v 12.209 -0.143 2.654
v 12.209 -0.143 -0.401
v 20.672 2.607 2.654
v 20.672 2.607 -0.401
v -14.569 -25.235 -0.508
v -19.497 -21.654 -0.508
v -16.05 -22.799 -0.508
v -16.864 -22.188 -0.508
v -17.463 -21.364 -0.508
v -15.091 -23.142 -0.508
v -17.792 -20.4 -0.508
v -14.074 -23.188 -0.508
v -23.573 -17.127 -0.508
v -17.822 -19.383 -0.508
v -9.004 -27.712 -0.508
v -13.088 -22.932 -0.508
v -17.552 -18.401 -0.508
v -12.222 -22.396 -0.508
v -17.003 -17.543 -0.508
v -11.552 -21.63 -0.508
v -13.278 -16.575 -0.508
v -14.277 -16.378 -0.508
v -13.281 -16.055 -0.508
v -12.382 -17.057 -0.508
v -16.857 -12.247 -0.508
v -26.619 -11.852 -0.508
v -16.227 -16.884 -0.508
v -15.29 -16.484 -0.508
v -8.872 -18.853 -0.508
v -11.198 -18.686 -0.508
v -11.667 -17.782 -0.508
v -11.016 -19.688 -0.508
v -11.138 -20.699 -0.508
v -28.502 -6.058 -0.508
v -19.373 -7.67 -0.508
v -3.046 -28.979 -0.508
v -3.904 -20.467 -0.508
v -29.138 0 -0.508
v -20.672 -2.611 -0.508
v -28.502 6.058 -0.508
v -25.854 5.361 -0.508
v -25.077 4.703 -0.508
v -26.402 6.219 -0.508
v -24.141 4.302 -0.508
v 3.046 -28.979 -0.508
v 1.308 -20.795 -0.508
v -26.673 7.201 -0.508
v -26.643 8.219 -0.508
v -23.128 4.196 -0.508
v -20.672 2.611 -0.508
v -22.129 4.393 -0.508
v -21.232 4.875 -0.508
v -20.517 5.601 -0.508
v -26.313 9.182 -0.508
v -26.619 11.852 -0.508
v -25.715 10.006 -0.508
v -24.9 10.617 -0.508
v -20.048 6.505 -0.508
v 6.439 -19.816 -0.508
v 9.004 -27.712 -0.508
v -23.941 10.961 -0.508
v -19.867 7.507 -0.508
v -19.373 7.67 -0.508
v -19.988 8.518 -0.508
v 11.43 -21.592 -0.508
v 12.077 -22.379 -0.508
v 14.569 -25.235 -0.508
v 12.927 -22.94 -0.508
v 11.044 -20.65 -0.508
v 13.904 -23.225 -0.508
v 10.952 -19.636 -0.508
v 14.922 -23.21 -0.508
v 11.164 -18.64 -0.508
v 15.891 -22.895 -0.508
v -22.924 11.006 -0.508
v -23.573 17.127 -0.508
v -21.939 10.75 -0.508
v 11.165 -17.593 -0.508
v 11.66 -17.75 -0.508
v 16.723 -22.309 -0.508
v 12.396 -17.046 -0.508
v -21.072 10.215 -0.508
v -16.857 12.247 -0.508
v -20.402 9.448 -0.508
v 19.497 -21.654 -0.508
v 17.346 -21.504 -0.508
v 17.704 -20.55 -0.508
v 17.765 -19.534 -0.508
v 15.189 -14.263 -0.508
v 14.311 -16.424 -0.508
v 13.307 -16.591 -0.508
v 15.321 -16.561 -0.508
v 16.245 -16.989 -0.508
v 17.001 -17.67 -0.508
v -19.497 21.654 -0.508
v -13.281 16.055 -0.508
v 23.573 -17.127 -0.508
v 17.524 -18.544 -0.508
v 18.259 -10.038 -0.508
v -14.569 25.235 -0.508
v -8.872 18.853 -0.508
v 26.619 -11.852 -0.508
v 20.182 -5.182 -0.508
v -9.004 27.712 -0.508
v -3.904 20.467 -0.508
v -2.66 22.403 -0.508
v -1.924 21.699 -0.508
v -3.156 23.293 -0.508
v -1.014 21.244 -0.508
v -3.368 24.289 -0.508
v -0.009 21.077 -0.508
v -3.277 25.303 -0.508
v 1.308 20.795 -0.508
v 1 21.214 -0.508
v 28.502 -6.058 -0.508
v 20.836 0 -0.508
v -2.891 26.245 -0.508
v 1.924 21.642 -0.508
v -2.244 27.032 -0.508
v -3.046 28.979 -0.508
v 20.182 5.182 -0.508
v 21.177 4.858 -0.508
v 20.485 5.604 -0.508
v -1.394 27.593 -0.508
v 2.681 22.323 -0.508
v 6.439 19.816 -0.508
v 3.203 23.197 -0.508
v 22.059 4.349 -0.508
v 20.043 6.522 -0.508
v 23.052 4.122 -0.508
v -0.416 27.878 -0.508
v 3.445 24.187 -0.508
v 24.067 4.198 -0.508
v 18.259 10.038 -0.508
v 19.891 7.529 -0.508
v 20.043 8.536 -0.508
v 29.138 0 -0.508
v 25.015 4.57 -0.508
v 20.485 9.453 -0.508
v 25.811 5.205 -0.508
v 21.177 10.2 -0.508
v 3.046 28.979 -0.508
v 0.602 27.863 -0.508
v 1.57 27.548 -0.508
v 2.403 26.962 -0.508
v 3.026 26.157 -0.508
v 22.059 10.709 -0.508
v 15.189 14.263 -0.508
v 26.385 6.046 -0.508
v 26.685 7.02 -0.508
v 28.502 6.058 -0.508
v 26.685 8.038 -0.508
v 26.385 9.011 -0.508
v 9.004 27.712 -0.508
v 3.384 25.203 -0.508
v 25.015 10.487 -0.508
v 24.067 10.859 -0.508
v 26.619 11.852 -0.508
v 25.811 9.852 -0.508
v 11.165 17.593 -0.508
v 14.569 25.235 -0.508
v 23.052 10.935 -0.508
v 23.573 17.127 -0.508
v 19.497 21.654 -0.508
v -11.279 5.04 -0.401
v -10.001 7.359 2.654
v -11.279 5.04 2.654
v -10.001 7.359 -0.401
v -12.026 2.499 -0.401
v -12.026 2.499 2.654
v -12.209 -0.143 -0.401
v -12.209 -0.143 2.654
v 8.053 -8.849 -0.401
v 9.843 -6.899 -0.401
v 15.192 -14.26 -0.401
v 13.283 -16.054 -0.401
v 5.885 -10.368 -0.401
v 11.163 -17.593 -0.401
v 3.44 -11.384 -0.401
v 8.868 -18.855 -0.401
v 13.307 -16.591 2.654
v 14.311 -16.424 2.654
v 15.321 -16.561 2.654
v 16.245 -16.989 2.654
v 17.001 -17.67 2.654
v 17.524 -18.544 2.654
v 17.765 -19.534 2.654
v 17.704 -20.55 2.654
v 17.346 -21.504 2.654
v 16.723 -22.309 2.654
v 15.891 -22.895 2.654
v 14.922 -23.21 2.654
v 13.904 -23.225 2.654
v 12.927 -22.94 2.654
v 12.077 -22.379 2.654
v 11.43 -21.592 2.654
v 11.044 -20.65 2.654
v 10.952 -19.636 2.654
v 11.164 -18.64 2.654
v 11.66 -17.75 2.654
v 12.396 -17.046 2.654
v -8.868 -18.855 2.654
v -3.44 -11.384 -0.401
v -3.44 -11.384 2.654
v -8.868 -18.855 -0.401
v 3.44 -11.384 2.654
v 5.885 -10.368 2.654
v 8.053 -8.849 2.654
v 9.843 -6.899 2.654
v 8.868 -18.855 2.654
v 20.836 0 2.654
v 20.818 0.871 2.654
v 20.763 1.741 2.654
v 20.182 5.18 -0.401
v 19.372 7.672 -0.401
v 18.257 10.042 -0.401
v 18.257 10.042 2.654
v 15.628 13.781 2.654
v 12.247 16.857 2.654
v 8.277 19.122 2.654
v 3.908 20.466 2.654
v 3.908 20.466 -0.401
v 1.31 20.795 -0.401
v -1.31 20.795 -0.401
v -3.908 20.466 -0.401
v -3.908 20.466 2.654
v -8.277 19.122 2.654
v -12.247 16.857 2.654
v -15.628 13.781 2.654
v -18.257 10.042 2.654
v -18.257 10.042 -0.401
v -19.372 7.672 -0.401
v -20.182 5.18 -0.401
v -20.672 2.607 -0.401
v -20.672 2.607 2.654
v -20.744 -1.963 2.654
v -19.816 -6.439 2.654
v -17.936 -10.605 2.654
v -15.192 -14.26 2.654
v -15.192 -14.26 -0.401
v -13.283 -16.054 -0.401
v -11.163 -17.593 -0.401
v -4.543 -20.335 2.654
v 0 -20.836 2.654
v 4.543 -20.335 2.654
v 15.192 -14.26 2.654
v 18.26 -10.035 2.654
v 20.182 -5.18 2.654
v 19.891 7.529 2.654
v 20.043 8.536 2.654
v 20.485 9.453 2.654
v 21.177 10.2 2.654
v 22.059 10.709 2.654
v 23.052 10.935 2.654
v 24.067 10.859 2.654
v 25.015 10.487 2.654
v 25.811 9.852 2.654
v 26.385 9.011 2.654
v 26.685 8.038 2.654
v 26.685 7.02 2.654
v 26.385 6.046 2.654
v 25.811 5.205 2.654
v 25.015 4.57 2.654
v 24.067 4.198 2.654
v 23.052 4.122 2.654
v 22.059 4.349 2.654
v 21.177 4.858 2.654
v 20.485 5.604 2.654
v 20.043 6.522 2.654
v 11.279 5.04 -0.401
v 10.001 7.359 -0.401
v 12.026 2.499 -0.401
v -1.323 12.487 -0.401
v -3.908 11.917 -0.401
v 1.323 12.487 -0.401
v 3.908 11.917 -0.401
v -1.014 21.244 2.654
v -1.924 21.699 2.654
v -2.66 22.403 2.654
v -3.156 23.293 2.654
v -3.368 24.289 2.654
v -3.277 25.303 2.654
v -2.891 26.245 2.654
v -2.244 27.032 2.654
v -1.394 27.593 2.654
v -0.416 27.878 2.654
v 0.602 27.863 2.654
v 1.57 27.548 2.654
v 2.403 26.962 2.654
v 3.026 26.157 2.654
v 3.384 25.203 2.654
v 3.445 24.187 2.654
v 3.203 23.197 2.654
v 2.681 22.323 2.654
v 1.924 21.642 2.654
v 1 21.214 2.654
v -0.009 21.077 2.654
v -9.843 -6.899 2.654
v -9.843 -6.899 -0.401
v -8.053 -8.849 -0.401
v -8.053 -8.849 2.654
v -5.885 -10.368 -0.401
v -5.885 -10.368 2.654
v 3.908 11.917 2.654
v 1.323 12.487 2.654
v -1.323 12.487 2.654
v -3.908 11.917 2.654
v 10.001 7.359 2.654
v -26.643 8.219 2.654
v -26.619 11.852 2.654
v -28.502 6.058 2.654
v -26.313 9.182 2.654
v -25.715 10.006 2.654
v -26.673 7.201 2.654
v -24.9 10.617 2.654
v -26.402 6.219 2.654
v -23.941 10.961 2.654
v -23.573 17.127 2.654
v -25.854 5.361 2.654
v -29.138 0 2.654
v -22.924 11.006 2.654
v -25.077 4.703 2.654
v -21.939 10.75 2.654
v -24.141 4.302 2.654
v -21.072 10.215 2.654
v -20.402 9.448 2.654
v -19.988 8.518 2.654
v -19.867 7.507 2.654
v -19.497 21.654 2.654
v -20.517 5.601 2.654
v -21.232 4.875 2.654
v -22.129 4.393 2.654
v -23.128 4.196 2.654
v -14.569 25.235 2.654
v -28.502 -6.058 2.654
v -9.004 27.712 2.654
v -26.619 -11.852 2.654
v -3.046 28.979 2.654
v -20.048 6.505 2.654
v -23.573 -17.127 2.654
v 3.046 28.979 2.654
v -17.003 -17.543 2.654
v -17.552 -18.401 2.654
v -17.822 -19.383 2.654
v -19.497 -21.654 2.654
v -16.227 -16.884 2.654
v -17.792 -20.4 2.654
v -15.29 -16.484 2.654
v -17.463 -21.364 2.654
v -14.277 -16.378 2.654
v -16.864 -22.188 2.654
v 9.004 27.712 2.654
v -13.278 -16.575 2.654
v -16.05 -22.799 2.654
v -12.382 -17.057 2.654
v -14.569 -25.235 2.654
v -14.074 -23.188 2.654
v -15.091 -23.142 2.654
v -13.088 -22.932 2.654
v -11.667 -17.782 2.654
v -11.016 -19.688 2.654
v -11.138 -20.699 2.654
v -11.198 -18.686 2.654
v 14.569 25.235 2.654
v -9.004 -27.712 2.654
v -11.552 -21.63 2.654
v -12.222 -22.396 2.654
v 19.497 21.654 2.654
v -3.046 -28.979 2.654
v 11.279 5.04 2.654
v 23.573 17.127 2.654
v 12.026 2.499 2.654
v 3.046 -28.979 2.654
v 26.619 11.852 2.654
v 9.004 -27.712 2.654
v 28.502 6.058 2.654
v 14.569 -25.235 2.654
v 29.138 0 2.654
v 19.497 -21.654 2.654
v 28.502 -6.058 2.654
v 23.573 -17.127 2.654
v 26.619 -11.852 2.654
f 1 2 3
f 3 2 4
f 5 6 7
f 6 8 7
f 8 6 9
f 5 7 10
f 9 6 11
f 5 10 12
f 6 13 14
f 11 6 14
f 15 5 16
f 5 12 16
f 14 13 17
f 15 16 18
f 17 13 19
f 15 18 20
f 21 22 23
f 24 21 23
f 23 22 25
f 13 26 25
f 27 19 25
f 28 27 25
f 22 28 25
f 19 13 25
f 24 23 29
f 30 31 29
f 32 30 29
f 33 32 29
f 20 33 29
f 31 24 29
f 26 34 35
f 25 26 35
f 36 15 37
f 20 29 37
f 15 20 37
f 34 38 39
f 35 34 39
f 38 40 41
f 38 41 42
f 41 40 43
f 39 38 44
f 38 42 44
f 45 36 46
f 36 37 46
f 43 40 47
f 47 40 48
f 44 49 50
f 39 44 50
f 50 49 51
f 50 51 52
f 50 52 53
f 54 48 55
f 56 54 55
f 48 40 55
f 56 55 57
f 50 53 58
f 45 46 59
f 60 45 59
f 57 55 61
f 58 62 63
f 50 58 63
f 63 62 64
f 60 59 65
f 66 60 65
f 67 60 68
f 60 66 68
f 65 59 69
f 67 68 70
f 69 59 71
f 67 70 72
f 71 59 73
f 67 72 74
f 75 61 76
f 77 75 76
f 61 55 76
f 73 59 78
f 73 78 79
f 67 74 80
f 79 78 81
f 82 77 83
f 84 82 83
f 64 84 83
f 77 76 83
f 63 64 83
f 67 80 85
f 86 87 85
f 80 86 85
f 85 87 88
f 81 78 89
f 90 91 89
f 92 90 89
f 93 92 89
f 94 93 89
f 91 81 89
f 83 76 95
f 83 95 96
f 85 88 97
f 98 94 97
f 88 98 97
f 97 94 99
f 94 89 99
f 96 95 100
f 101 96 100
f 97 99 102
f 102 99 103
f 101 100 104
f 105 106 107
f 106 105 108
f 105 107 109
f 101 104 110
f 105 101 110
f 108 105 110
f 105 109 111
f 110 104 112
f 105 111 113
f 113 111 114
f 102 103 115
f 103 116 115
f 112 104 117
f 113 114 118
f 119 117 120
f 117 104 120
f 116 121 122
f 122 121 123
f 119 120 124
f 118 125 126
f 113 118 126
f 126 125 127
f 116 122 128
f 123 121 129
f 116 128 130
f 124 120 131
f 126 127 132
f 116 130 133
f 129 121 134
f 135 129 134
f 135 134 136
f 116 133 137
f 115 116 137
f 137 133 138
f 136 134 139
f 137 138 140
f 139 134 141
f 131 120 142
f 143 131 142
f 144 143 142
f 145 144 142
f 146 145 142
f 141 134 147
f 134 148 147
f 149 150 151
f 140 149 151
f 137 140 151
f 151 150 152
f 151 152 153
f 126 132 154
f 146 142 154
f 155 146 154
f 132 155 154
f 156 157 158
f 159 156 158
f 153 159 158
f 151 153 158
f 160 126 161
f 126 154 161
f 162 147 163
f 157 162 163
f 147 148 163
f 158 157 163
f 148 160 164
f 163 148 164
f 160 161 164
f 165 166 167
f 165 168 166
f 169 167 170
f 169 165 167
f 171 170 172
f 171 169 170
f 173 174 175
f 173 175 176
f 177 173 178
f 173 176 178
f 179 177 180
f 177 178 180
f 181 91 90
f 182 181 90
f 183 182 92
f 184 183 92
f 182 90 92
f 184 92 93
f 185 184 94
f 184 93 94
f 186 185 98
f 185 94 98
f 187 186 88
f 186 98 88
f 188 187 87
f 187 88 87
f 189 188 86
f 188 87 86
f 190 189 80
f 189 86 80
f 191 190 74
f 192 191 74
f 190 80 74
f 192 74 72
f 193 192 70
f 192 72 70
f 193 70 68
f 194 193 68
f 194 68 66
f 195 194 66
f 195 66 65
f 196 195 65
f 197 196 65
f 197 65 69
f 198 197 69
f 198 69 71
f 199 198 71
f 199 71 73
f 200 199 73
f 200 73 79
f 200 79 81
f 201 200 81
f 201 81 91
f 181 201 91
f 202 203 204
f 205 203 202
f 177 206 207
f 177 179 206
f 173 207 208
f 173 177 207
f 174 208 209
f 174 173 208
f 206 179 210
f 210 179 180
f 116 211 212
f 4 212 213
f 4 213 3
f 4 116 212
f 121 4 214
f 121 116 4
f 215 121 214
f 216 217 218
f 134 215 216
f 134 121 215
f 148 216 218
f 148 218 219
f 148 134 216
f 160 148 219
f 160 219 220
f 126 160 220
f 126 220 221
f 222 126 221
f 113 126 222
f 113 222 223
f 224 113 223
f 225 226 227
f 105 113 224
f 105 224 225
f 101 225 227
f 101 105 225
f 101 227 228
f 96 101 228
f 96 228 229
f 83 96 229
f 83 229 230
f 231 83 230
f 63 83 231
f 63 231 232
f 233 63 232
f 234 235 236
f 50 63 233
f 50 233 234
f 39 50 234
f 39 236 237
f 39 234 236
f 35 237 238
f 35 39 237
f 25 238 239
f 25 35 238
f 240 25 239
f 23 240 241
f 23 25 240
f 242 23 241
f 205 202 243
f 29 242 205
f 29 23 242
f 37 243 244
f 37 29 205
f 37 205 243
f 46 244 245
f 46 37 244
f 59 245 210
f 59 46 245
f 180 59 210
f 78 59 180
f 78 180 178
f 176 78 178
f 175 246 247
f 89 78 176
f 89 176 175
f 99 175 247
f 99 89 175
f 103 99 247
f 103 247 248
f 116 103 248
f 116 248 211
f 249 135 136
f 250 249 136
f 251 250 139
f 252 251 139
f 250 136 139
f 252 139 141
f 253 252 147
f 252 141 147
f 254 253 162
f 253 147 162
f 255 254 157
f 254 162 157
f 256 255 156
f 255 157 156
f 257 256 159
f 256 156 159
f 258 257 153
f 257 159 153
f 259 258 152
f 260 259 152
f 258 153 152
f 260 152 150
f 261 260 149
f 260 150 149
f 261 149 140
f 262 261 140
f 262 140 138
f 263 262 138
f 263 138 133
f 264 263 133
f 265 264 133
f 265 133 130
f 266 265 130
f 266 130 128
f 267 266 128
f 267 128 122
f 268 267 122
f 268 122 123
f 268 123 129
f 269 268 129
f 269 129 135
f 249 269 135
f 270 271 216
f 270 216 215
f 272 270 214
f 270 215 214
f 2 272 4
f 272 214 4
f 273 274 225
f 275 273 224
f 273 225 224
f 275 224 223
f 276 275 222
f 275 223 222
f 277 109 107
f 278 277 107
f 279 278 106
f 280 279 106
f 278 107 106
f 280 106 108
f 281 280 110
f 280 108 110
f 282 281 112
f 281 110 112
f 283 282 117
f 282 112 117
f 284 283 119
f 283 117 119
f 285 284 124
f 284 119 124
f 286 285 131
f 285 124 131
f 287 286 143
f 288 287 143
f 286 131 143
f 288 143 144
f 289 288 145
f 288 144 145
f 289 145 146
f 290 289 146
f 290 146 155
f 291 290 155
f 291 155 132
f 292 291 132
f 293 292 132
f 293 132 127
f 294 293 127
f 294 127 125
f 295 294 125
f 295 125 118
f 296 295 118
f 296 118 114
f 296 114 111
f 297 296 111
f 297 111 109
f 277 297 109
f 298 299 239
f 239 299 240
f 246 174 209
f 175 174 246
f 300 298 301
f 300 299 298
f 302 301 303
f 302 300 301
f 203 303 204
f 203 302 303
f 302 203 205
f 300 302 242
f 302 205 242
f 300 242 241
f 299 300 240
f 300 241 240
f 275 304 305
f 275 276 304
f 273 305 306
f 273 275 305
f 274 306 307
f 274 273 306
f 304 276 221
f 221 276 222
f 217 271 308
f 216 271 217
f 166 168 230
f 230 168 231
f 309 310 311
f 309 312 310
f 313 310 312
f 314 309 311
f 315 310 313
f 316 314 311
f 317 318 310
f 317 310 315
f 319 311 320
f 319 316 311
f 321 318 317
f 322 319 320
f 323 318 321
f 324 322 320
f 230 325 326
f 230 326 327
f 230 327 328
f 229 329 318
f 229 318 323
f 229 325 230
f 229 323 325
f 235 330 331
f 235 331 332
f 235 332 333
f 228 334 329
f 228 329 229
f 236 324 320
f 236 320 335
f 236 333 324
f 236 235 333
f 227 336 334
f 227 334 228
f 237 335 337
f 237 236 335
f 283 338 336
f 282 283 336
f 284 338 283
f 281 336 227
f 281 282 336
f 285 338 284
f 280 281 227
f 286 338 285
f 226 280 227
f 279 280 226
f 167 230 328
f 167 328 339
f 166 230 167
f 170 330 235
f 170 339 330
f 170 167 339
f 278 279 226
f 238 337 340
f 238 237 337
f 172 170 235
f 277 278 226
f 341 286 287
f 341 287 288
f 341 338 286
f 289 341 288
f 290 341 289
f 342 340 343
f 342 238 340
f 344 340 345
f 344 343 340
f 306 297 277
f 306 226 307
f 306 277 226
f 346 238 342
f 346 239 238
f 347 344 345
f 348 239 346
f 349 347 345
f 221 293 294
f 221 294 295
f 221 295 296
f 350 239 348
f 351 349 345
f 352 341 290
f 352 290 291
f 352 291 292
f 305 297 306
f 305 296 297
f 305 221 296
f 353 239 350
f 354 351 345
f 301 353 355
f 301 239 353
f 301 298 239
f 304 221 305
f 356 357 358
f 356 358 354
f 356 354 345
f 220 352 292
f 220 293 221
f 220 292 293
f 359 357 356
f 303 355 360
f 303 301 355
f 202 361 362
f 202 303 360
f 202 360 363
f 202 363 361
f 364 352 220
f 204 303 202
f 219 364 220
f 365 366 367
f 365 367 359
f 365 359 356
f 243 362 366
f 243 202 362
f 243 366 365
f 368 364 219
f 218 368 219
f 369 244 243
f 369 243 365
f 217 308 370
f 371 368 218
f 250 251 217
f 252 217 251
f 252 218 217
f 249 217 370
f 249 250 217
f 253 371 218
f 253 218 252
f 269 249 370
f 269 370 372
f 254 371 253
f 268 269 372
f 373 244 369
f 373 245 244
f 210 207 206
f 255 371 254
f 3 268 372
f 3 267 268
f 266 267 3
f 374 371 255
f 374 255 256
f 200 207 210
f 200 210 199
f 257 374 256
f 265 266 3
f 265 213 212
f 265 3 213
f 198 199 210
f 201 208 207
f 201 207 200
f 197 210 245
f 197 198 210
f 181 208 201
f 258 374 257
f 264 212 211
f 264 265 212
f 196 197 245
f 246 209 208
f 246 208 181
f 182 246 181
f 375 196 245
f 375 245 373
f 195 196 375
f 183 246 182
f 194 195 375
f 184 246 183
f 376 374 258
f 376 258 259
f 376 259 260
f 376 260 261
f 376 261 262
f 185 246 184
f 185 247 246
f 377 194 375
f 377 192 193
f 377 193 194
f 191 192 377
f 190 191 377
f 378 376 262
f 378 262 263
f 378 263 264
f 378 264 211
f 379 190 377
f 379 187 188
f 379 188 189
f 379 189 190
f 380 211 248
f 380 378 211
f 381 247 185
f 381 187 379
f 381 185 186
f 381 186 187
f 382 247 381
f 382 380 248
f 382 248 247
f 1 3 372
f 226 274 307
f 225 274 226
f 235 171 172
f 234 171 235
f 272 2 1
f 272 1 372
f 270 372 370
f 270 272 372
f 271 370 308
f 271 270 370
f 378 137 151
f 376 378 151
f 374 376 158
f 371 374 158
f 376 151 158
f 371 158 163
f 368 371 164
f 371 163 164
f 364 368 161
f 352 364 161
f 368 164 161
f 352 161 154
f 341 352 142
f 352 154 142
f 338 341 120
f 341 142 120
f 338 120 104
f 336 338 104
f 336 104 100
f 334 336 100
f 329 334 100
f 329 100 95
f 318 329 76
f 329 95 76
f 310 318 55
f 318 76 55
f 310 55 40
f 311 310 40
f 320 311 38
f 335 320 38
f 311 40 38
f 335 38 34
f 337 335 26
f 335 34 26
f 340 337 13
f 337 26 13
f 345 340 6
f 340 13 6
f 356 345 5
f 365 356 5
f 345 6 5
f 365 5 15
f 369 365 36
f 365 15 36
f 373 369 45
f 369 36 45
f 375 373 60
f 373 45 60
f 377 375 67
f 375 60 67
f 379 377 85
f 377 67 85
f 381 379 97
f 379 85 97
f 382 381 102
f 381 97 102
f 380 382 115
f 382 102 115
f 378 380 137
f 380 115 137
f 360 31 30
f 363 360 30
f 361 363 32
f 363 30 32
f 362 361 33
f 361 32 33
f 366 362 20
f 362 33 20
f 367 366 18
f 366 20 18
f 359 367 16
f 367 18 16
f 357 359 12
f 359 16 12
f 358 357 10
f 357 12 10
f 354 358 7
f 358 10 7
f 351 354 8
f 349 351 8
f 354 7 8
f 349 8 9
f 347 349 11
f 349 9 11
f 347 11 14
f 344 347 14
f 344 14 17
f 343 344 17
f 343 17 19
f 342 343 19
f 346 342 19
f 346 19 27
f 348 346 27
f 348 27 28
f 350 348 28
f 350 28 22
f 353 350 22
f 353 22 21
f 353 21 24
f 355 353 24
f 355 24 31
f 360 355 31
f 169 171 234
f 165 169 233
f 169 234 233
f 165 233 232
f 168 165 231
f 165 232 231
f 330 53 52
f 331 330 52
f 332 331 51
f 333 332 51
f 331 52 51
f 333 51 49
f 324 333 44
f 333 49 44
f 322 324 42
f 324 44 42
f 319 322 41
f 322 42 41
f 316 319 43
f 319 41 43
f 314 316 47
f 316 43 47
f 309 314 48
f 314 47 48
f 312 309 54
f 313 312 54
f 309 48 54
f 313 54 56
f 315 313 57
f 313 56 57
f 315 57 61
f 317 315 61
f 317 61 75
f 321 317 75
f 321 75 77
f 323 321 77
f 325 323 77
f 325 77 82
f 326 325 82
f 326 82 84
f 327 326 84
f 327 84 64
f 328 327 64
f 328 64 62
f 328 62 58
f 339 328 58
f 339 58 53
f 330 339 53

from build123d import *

# Parameters (mm, degrees)
RING_DEPTH              = 2.653567955
RING_DEPTH_BACK         = 0.508
SKETCH2_R               = 29.138416471
SKETCH2_R_2             = 20.83618439
TEETH_START             = -0.401310706
SKETCH4_W               = 7.816761814
SKETCH4_H               = 9.871955338
TEETH_DEPTH             = 3.054878706
CIRPATTERN1_COUNT       = 5
SKETCH6_R               = 3.416225964
CUT_EXTRUDE1_DEPTH      = 8.89
CIRPATTERN2_COUNT       = 5
CUT_EXTRUDE3_DEPTH      = 7.874
CUT_EXTRUDE3_DEPTH_BACK = 5.08
SKETCH7_R               = 12.218567197


with BuildPart() as part:
    # Sketch2 → Ring (new, two sides: drawn at the far end of the back side and taken through both)
    with BuildSketch(Plane.XY.offset(-RING_DEPTH_BACK)):
        Circle(SKETCH2_R)
        Circle(SKETCH2_R_2, mode=Mode.SUBTRACT)
    extrude(amount=RING_DEPTH + RING_DEPTH_BACK)

    # Sketch4 → Teeth (add)
    with BuildSketch(Plane.XY.offset(TEETH_START)):
        with Locations((0, 15.900206721)):
            Rectangle(SKETCH4_W, SKETCH4_H)
    teeth = extrude(amount=TEETH_DEPTH)

    # CirPattern1: Teeth ×5 about axis
    cirpattern1_axis = Axis((0, 0, 0), (0, 0, 1))
    for i in range(1, CIRPATTERN1_COUNT):
        add(teeth.rotate(cirpattern1_axis, i * 360 / CIRPATTERN1_COUNT))

    # Sketch6 → Cut-Extrude1 (cut)
    with BuildSketch(Plane(origin=(0, 0, -0.508), x_dir=(-1, 0, 0), z_dir=(0, 0, -1))):
        with Locations((-23.307220113, 7.528711947)):
            Circle(SKETCH6_R)
    cut_extrude1 = extrude(amount=-CUT_EXTRUDE1_DEPTH, mode=Mode.SUBTRACT)

    # CirPattern2: Cut-Extrude1 ×5 about axis
    cirpattern2_axis = Axis((0, 0, 0), (0, 0, 1))
    for i in range(1, CIRPATTERN2_COUNT):
        add(cut_extrude1.rotate(cirpattern2_axis, i * 360 / CIRPATTERN2_COUNT), mode=Mode.SUBTRACT)

    # Sketch7 → Cut-Extrude3 (cut, two sides: drawn at the far end of the back side and taken through both)
    with BuildSketch(Plane.XY.offset(-CUT_EXTRUDE3_DEPTH_BACK)):
        with Locations((0, 0.340402239)):
            Circle(SKETCH7_R)
    extrude(amount=CUT_EXTRUDE3_DEPTH + CUT_EXTRUDE3_DEPTH_BACK, mode=Mode.SUBTRACT)


solid = part.part
